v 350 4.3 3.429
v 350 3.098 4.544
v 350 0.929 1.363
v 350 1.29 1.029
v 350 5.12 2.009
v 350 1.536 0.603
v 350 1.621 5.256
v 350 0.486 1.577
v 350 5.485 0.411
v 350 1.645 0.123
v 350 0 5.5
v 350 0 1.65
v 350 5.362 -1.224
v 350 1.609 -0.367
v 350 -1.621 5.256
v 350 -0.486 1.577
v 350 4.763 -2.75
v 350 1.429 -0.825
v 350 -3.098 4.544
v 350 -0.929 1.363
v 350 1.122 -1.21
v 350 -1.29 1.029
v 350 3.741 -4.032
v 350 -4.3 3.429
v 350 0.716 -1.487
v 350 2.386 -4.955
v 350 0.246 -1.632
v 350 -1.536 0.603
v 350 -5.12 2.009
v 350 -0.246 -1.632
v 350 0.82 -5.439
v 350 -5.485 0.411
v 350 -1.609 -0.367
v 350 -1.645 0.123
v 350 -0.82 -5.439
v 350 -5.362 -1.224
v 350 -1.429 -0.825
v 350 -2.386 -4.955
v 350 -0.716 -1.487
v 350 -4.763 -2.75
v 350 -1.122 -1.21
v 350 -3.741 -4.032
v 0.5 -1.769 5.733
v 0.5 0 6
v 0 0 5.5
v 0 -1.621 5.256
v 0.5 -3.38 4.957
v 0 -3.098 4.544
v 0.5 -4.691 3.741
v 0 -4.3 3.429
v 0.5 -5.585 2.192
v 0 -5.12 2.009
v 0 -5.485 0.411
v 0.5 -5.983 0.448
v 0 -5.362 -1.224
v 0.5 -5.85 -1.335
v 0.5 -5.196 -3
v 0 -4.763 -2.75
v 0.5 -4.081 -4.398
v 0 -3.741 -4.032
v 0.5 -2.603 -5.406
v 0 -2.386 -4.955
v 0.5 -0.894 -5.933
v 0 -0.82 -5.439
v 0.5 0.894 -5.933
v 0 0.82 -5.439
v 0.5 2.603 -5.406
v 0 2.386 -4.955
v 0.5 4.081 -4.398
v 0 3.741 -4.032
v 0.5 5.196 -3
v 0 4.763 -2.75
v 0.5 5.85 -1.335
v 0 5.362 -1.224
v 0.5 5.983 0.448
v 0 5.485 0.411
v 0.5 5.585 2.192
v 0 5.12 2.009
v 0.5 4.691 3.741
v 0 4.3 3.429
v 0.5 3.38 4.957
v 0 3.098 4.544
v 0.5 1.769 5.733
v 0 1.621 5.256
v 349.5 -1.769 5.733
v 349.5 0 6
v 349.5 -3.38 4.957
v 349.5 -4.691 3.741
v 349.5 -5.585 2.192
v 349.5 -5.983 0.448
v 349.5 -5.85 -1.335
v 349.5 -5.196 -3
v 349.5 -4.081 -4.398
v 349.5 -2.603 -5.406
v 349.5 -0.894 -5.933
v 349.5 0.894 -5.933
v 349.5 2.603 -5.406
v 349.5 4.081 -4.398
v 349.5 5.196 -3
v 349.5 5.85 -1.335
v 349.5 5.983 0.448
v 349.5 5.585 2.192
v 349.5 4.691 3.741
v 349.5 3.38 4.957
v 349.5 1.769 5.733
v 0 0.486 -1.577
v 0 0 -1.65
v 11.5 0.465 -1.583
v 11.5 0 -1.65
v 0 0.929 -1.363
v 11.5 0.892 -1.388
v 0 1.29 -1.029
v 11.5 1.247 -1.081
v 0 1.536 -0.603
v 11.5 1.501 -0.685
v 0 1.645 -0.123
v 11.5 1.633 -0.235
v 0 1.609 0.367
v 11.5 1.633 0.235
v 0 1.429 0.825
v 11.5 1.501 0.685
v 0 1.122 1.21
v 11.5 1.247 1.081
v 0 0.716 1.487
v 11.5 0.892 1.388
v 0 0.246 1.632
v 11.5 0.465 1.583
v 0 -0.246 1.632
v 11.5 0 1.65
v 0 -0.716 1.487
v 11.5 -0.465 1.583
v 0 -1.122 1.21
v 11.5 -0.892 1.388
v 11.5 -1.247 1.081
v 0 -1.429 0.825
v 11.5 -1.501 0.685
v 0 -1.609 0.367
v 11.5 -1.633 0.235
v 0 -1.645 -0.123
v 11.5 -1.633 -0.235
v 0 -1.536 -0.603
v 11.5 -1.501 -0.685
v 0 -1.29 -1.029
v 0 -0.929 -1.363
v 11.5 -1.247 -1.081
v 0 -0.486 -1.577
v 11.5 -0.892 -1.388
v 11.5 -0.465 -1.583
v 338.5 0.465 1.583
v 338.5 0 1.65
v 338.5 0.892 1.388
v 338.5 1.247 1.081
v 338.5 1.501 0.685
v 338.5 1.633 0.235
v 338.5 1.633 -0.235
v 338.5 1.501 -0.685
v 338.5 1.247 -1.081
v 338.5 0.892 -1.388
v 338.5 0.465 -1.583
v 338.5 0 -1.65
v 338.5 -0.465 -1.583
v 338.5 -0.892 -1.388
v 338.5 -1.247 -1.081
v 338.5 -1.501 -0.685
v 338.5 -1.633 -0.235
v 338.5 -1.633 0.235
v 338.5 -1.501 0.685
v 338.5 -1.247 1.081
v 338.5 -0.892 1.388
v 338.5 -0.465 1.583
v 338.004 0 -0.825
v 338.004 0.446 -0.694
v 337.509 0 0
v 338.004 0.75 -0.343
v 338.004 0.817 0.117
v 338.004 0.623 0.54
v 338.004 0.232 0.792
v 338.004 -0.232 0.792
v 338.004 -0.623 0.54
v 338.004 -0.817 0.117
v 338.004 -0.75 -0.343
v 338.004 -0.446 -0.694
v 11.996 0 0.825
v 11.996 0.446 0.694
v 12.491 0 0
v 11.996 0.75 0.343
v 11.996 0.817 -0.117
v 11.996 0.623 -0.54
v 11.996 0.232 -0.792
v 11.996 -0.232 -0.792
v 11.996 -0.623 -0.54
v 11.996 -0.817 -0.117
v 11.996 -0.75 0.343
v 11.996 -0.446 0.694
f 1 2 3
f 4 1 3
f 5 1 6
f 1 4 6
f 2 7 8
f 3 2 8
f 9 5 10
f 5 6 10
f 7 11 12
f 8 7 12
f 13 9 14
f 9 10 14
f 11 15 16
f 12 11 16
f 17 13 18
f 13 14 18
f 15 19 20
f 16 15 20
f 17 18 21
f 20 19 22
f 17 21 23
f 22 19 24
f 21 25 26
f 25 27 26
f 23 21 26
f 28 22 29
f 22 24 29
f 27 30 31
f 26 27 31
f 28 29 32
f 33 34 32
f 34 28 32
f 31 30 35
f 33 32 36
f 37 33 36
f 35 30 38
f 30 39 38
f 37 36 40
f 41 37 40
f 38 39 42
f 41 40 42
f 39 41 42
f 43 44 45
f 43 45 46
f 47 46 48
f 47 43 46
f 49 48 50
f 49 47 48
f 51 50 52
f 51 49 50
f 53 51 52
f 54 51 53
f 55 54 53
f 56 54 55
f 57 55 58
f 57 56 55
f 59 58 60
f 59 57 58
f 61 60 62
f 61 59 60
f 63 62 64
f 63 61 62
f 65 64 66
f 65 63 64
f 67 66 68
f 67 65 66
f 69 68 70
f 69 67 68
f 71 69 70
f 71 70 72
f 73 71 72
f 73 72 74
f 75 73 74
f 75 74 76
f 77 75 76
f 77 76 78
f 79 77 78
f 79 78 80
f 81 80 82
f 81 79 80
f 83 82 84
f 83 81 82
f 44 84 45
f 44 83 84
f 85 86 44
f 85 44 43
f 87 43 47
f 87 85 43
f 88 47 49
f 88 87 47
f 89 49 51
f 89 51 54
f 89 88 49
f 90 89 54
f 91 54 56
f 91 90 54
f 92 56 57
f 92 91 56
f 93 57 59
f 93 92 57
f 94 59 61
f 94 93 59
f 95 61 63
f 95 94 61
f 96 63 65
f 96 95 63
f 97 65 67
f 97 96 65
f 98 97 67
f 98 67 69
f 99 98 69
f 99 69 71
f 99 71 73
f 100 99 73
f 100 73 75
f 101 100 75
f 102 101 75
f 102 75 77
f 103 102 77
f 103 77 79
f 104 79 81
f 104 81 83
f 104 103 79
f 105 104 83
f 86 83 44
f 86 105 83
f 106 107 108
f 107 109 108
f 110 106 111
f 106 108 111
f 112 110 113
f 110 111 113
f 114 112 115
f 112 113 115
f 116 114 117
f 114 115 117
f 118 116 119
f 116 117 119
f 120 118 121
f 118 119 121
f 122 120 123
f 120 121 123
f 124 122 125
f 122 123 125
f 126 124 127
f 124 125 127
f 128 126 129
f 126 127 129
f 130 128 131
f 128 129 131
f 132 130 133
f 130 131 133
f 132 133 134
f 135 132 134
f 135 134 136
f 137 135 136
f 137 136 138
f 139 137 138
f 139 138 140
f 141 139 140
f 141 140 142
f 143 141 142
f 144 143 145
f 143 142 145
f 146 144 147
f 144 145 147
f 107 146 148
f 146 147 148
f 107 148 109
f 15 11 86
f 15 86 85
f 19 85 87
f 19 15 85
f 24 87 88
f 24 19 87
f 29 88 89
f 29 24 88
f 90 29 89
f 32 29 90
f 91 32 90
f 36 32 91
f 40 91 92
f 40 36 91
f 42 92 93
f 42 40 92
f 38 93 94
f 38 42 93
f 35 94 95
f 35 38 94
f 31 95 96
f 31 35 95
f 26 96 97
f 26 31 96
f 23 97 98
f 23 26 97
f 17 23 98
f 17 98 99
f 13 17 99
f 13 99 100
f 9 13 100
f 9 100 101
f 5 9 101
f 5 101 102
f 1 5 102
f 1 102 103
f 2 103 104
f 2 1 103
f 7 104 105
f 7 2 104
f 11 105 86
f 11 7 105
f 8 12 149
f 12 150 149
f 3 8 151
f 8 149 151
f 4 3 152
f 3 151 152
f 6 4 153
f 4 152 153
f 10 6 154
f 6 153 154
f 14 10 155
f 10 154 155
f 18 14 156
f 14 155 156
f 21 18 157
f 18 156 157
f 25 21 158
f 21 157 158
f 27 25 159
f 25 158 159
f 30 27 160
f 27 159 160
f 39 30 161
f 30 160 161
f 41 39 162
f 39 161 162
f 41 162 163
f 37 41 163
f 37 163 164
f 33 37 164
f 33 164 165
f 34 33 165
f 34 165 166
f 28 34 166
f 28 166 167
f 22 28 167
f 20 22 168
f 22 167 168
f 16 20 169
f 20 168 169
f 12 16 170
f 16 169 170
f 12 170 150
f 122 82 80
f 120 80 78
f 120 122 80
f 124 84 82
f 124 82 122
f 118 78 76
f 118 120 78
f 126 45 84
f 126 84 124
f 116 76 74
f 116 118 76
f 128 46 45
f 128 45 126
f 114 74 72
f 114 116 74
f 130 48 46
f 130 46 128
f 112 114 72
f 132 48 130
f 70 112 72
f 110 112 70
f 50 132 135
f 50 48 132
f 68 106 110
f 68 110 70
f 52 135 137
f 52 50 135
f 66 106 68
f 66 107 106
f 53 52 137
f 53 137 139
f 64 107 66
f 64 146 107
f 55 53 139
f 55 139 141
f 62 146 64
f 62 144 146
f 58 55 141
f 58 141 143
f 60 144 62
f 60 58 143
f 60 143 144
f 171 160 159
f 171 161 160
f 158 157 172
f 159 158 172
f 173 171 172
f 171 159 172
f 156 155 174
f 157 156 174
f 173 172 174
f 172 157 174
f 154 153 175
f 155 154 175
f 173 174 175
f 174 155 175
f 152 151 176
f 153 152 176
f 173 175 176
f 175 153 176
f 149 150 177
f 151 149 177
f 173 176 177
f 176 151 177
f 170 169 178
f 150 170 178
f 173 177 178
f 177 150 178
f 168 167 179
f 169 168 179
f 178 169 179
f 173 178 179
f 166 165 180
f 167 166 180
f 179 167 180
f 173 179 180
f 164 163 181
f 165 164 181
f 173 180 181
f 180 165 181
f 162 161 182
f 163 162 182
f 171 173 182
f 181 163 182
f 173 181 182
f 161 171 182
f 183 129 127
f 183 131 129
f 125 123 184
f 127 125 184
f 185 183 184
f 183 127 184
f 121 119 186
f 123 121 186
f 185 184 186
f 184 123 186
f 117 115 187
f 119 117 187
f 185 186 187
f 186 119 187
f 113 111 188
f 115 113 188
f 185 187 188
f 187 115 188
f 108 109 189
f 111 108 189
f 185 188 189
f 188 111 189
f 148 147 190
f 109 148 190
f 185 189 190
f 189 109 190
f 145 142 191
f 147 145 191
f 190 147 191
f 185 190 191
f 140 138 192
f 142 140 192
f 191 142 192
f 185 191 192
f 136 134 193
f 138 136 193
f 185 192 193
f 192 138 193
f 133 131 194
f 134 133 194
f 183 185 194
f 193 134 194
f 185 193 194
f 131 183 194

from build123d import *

# Parameters (mm, degrees)
SKETCH1_W          = 350
SKETCH1_H          = 6
TAPPED_HOLE1_D     = 3.3
TAPPED_HOLE1_DEPTH = 11.5
TAPPED_HOLE1_TIP   = 0.991420021
TAPPED_HOLE2_D     = 3.3
TAPPED_HOLE2_DEPTH = 11.5
TAPPED_HOLE2_TIP   = 0.991420021
CHAMFER1_SIZE      = 0.5


with BuildPart() as part:
    # Sketch1 → Revolve1 (revolve)
    with BuildSketch(Plane.XY):
        with Locations((175, 3)):
            Rectangle(SKETCH1_W, SKETCH1_H)
    revolve(axis=Axis((0, 0, 0), (1, 0, 0)))

    # Tapped Hole1
    with Locations(Plane.ZY):
        with Locations((0, 0)):
            Hole(TAPPED_HOLE1_D / 2, depth=TAPPED_HOLE1_DEPTH)
            with Locations((0, 0, -(TAPPED_HOLE1_DEPTH + TAPPED_HOLE1_TIP / 2))):  # 118° drill point
                Cone(0, TAPPED_HOLE1_D / 2, TAPPED_HOLE1_TIP, mode=Mode.SUBTRACT)

    # Tapped Hole2
    with Locations(Plane(origin=(350, 0, 0), x_dir=(0, 0, -1), z_dir=(1, 0, 0))):
        with Locations((0, 0)):
            Hole(TAPPED_HOLE2_D / 2, depth=TAPPED_HOLE2_DEPTH)
            with Locations((0, 0, -(TAPPED_HOLE2_DEPTH + TAPPED_HOLE2_TIP / 2))):  # 118° drill point
                Cone(0, TAPPED_HOLE2_D / 2, TAPPED_HOLE2_TIP, mode=Mode.SUBTRACT)

    # Chamfer1
    chamfer1_edges = [part.edges().sort_by_distance(p)[0] for p in [
        (0, -6, 0),
        (350, -6, 0),
    ]]
    chamfer(chamfer1_edges, length=CHAMFER1_SIZE)


solid = part.part
